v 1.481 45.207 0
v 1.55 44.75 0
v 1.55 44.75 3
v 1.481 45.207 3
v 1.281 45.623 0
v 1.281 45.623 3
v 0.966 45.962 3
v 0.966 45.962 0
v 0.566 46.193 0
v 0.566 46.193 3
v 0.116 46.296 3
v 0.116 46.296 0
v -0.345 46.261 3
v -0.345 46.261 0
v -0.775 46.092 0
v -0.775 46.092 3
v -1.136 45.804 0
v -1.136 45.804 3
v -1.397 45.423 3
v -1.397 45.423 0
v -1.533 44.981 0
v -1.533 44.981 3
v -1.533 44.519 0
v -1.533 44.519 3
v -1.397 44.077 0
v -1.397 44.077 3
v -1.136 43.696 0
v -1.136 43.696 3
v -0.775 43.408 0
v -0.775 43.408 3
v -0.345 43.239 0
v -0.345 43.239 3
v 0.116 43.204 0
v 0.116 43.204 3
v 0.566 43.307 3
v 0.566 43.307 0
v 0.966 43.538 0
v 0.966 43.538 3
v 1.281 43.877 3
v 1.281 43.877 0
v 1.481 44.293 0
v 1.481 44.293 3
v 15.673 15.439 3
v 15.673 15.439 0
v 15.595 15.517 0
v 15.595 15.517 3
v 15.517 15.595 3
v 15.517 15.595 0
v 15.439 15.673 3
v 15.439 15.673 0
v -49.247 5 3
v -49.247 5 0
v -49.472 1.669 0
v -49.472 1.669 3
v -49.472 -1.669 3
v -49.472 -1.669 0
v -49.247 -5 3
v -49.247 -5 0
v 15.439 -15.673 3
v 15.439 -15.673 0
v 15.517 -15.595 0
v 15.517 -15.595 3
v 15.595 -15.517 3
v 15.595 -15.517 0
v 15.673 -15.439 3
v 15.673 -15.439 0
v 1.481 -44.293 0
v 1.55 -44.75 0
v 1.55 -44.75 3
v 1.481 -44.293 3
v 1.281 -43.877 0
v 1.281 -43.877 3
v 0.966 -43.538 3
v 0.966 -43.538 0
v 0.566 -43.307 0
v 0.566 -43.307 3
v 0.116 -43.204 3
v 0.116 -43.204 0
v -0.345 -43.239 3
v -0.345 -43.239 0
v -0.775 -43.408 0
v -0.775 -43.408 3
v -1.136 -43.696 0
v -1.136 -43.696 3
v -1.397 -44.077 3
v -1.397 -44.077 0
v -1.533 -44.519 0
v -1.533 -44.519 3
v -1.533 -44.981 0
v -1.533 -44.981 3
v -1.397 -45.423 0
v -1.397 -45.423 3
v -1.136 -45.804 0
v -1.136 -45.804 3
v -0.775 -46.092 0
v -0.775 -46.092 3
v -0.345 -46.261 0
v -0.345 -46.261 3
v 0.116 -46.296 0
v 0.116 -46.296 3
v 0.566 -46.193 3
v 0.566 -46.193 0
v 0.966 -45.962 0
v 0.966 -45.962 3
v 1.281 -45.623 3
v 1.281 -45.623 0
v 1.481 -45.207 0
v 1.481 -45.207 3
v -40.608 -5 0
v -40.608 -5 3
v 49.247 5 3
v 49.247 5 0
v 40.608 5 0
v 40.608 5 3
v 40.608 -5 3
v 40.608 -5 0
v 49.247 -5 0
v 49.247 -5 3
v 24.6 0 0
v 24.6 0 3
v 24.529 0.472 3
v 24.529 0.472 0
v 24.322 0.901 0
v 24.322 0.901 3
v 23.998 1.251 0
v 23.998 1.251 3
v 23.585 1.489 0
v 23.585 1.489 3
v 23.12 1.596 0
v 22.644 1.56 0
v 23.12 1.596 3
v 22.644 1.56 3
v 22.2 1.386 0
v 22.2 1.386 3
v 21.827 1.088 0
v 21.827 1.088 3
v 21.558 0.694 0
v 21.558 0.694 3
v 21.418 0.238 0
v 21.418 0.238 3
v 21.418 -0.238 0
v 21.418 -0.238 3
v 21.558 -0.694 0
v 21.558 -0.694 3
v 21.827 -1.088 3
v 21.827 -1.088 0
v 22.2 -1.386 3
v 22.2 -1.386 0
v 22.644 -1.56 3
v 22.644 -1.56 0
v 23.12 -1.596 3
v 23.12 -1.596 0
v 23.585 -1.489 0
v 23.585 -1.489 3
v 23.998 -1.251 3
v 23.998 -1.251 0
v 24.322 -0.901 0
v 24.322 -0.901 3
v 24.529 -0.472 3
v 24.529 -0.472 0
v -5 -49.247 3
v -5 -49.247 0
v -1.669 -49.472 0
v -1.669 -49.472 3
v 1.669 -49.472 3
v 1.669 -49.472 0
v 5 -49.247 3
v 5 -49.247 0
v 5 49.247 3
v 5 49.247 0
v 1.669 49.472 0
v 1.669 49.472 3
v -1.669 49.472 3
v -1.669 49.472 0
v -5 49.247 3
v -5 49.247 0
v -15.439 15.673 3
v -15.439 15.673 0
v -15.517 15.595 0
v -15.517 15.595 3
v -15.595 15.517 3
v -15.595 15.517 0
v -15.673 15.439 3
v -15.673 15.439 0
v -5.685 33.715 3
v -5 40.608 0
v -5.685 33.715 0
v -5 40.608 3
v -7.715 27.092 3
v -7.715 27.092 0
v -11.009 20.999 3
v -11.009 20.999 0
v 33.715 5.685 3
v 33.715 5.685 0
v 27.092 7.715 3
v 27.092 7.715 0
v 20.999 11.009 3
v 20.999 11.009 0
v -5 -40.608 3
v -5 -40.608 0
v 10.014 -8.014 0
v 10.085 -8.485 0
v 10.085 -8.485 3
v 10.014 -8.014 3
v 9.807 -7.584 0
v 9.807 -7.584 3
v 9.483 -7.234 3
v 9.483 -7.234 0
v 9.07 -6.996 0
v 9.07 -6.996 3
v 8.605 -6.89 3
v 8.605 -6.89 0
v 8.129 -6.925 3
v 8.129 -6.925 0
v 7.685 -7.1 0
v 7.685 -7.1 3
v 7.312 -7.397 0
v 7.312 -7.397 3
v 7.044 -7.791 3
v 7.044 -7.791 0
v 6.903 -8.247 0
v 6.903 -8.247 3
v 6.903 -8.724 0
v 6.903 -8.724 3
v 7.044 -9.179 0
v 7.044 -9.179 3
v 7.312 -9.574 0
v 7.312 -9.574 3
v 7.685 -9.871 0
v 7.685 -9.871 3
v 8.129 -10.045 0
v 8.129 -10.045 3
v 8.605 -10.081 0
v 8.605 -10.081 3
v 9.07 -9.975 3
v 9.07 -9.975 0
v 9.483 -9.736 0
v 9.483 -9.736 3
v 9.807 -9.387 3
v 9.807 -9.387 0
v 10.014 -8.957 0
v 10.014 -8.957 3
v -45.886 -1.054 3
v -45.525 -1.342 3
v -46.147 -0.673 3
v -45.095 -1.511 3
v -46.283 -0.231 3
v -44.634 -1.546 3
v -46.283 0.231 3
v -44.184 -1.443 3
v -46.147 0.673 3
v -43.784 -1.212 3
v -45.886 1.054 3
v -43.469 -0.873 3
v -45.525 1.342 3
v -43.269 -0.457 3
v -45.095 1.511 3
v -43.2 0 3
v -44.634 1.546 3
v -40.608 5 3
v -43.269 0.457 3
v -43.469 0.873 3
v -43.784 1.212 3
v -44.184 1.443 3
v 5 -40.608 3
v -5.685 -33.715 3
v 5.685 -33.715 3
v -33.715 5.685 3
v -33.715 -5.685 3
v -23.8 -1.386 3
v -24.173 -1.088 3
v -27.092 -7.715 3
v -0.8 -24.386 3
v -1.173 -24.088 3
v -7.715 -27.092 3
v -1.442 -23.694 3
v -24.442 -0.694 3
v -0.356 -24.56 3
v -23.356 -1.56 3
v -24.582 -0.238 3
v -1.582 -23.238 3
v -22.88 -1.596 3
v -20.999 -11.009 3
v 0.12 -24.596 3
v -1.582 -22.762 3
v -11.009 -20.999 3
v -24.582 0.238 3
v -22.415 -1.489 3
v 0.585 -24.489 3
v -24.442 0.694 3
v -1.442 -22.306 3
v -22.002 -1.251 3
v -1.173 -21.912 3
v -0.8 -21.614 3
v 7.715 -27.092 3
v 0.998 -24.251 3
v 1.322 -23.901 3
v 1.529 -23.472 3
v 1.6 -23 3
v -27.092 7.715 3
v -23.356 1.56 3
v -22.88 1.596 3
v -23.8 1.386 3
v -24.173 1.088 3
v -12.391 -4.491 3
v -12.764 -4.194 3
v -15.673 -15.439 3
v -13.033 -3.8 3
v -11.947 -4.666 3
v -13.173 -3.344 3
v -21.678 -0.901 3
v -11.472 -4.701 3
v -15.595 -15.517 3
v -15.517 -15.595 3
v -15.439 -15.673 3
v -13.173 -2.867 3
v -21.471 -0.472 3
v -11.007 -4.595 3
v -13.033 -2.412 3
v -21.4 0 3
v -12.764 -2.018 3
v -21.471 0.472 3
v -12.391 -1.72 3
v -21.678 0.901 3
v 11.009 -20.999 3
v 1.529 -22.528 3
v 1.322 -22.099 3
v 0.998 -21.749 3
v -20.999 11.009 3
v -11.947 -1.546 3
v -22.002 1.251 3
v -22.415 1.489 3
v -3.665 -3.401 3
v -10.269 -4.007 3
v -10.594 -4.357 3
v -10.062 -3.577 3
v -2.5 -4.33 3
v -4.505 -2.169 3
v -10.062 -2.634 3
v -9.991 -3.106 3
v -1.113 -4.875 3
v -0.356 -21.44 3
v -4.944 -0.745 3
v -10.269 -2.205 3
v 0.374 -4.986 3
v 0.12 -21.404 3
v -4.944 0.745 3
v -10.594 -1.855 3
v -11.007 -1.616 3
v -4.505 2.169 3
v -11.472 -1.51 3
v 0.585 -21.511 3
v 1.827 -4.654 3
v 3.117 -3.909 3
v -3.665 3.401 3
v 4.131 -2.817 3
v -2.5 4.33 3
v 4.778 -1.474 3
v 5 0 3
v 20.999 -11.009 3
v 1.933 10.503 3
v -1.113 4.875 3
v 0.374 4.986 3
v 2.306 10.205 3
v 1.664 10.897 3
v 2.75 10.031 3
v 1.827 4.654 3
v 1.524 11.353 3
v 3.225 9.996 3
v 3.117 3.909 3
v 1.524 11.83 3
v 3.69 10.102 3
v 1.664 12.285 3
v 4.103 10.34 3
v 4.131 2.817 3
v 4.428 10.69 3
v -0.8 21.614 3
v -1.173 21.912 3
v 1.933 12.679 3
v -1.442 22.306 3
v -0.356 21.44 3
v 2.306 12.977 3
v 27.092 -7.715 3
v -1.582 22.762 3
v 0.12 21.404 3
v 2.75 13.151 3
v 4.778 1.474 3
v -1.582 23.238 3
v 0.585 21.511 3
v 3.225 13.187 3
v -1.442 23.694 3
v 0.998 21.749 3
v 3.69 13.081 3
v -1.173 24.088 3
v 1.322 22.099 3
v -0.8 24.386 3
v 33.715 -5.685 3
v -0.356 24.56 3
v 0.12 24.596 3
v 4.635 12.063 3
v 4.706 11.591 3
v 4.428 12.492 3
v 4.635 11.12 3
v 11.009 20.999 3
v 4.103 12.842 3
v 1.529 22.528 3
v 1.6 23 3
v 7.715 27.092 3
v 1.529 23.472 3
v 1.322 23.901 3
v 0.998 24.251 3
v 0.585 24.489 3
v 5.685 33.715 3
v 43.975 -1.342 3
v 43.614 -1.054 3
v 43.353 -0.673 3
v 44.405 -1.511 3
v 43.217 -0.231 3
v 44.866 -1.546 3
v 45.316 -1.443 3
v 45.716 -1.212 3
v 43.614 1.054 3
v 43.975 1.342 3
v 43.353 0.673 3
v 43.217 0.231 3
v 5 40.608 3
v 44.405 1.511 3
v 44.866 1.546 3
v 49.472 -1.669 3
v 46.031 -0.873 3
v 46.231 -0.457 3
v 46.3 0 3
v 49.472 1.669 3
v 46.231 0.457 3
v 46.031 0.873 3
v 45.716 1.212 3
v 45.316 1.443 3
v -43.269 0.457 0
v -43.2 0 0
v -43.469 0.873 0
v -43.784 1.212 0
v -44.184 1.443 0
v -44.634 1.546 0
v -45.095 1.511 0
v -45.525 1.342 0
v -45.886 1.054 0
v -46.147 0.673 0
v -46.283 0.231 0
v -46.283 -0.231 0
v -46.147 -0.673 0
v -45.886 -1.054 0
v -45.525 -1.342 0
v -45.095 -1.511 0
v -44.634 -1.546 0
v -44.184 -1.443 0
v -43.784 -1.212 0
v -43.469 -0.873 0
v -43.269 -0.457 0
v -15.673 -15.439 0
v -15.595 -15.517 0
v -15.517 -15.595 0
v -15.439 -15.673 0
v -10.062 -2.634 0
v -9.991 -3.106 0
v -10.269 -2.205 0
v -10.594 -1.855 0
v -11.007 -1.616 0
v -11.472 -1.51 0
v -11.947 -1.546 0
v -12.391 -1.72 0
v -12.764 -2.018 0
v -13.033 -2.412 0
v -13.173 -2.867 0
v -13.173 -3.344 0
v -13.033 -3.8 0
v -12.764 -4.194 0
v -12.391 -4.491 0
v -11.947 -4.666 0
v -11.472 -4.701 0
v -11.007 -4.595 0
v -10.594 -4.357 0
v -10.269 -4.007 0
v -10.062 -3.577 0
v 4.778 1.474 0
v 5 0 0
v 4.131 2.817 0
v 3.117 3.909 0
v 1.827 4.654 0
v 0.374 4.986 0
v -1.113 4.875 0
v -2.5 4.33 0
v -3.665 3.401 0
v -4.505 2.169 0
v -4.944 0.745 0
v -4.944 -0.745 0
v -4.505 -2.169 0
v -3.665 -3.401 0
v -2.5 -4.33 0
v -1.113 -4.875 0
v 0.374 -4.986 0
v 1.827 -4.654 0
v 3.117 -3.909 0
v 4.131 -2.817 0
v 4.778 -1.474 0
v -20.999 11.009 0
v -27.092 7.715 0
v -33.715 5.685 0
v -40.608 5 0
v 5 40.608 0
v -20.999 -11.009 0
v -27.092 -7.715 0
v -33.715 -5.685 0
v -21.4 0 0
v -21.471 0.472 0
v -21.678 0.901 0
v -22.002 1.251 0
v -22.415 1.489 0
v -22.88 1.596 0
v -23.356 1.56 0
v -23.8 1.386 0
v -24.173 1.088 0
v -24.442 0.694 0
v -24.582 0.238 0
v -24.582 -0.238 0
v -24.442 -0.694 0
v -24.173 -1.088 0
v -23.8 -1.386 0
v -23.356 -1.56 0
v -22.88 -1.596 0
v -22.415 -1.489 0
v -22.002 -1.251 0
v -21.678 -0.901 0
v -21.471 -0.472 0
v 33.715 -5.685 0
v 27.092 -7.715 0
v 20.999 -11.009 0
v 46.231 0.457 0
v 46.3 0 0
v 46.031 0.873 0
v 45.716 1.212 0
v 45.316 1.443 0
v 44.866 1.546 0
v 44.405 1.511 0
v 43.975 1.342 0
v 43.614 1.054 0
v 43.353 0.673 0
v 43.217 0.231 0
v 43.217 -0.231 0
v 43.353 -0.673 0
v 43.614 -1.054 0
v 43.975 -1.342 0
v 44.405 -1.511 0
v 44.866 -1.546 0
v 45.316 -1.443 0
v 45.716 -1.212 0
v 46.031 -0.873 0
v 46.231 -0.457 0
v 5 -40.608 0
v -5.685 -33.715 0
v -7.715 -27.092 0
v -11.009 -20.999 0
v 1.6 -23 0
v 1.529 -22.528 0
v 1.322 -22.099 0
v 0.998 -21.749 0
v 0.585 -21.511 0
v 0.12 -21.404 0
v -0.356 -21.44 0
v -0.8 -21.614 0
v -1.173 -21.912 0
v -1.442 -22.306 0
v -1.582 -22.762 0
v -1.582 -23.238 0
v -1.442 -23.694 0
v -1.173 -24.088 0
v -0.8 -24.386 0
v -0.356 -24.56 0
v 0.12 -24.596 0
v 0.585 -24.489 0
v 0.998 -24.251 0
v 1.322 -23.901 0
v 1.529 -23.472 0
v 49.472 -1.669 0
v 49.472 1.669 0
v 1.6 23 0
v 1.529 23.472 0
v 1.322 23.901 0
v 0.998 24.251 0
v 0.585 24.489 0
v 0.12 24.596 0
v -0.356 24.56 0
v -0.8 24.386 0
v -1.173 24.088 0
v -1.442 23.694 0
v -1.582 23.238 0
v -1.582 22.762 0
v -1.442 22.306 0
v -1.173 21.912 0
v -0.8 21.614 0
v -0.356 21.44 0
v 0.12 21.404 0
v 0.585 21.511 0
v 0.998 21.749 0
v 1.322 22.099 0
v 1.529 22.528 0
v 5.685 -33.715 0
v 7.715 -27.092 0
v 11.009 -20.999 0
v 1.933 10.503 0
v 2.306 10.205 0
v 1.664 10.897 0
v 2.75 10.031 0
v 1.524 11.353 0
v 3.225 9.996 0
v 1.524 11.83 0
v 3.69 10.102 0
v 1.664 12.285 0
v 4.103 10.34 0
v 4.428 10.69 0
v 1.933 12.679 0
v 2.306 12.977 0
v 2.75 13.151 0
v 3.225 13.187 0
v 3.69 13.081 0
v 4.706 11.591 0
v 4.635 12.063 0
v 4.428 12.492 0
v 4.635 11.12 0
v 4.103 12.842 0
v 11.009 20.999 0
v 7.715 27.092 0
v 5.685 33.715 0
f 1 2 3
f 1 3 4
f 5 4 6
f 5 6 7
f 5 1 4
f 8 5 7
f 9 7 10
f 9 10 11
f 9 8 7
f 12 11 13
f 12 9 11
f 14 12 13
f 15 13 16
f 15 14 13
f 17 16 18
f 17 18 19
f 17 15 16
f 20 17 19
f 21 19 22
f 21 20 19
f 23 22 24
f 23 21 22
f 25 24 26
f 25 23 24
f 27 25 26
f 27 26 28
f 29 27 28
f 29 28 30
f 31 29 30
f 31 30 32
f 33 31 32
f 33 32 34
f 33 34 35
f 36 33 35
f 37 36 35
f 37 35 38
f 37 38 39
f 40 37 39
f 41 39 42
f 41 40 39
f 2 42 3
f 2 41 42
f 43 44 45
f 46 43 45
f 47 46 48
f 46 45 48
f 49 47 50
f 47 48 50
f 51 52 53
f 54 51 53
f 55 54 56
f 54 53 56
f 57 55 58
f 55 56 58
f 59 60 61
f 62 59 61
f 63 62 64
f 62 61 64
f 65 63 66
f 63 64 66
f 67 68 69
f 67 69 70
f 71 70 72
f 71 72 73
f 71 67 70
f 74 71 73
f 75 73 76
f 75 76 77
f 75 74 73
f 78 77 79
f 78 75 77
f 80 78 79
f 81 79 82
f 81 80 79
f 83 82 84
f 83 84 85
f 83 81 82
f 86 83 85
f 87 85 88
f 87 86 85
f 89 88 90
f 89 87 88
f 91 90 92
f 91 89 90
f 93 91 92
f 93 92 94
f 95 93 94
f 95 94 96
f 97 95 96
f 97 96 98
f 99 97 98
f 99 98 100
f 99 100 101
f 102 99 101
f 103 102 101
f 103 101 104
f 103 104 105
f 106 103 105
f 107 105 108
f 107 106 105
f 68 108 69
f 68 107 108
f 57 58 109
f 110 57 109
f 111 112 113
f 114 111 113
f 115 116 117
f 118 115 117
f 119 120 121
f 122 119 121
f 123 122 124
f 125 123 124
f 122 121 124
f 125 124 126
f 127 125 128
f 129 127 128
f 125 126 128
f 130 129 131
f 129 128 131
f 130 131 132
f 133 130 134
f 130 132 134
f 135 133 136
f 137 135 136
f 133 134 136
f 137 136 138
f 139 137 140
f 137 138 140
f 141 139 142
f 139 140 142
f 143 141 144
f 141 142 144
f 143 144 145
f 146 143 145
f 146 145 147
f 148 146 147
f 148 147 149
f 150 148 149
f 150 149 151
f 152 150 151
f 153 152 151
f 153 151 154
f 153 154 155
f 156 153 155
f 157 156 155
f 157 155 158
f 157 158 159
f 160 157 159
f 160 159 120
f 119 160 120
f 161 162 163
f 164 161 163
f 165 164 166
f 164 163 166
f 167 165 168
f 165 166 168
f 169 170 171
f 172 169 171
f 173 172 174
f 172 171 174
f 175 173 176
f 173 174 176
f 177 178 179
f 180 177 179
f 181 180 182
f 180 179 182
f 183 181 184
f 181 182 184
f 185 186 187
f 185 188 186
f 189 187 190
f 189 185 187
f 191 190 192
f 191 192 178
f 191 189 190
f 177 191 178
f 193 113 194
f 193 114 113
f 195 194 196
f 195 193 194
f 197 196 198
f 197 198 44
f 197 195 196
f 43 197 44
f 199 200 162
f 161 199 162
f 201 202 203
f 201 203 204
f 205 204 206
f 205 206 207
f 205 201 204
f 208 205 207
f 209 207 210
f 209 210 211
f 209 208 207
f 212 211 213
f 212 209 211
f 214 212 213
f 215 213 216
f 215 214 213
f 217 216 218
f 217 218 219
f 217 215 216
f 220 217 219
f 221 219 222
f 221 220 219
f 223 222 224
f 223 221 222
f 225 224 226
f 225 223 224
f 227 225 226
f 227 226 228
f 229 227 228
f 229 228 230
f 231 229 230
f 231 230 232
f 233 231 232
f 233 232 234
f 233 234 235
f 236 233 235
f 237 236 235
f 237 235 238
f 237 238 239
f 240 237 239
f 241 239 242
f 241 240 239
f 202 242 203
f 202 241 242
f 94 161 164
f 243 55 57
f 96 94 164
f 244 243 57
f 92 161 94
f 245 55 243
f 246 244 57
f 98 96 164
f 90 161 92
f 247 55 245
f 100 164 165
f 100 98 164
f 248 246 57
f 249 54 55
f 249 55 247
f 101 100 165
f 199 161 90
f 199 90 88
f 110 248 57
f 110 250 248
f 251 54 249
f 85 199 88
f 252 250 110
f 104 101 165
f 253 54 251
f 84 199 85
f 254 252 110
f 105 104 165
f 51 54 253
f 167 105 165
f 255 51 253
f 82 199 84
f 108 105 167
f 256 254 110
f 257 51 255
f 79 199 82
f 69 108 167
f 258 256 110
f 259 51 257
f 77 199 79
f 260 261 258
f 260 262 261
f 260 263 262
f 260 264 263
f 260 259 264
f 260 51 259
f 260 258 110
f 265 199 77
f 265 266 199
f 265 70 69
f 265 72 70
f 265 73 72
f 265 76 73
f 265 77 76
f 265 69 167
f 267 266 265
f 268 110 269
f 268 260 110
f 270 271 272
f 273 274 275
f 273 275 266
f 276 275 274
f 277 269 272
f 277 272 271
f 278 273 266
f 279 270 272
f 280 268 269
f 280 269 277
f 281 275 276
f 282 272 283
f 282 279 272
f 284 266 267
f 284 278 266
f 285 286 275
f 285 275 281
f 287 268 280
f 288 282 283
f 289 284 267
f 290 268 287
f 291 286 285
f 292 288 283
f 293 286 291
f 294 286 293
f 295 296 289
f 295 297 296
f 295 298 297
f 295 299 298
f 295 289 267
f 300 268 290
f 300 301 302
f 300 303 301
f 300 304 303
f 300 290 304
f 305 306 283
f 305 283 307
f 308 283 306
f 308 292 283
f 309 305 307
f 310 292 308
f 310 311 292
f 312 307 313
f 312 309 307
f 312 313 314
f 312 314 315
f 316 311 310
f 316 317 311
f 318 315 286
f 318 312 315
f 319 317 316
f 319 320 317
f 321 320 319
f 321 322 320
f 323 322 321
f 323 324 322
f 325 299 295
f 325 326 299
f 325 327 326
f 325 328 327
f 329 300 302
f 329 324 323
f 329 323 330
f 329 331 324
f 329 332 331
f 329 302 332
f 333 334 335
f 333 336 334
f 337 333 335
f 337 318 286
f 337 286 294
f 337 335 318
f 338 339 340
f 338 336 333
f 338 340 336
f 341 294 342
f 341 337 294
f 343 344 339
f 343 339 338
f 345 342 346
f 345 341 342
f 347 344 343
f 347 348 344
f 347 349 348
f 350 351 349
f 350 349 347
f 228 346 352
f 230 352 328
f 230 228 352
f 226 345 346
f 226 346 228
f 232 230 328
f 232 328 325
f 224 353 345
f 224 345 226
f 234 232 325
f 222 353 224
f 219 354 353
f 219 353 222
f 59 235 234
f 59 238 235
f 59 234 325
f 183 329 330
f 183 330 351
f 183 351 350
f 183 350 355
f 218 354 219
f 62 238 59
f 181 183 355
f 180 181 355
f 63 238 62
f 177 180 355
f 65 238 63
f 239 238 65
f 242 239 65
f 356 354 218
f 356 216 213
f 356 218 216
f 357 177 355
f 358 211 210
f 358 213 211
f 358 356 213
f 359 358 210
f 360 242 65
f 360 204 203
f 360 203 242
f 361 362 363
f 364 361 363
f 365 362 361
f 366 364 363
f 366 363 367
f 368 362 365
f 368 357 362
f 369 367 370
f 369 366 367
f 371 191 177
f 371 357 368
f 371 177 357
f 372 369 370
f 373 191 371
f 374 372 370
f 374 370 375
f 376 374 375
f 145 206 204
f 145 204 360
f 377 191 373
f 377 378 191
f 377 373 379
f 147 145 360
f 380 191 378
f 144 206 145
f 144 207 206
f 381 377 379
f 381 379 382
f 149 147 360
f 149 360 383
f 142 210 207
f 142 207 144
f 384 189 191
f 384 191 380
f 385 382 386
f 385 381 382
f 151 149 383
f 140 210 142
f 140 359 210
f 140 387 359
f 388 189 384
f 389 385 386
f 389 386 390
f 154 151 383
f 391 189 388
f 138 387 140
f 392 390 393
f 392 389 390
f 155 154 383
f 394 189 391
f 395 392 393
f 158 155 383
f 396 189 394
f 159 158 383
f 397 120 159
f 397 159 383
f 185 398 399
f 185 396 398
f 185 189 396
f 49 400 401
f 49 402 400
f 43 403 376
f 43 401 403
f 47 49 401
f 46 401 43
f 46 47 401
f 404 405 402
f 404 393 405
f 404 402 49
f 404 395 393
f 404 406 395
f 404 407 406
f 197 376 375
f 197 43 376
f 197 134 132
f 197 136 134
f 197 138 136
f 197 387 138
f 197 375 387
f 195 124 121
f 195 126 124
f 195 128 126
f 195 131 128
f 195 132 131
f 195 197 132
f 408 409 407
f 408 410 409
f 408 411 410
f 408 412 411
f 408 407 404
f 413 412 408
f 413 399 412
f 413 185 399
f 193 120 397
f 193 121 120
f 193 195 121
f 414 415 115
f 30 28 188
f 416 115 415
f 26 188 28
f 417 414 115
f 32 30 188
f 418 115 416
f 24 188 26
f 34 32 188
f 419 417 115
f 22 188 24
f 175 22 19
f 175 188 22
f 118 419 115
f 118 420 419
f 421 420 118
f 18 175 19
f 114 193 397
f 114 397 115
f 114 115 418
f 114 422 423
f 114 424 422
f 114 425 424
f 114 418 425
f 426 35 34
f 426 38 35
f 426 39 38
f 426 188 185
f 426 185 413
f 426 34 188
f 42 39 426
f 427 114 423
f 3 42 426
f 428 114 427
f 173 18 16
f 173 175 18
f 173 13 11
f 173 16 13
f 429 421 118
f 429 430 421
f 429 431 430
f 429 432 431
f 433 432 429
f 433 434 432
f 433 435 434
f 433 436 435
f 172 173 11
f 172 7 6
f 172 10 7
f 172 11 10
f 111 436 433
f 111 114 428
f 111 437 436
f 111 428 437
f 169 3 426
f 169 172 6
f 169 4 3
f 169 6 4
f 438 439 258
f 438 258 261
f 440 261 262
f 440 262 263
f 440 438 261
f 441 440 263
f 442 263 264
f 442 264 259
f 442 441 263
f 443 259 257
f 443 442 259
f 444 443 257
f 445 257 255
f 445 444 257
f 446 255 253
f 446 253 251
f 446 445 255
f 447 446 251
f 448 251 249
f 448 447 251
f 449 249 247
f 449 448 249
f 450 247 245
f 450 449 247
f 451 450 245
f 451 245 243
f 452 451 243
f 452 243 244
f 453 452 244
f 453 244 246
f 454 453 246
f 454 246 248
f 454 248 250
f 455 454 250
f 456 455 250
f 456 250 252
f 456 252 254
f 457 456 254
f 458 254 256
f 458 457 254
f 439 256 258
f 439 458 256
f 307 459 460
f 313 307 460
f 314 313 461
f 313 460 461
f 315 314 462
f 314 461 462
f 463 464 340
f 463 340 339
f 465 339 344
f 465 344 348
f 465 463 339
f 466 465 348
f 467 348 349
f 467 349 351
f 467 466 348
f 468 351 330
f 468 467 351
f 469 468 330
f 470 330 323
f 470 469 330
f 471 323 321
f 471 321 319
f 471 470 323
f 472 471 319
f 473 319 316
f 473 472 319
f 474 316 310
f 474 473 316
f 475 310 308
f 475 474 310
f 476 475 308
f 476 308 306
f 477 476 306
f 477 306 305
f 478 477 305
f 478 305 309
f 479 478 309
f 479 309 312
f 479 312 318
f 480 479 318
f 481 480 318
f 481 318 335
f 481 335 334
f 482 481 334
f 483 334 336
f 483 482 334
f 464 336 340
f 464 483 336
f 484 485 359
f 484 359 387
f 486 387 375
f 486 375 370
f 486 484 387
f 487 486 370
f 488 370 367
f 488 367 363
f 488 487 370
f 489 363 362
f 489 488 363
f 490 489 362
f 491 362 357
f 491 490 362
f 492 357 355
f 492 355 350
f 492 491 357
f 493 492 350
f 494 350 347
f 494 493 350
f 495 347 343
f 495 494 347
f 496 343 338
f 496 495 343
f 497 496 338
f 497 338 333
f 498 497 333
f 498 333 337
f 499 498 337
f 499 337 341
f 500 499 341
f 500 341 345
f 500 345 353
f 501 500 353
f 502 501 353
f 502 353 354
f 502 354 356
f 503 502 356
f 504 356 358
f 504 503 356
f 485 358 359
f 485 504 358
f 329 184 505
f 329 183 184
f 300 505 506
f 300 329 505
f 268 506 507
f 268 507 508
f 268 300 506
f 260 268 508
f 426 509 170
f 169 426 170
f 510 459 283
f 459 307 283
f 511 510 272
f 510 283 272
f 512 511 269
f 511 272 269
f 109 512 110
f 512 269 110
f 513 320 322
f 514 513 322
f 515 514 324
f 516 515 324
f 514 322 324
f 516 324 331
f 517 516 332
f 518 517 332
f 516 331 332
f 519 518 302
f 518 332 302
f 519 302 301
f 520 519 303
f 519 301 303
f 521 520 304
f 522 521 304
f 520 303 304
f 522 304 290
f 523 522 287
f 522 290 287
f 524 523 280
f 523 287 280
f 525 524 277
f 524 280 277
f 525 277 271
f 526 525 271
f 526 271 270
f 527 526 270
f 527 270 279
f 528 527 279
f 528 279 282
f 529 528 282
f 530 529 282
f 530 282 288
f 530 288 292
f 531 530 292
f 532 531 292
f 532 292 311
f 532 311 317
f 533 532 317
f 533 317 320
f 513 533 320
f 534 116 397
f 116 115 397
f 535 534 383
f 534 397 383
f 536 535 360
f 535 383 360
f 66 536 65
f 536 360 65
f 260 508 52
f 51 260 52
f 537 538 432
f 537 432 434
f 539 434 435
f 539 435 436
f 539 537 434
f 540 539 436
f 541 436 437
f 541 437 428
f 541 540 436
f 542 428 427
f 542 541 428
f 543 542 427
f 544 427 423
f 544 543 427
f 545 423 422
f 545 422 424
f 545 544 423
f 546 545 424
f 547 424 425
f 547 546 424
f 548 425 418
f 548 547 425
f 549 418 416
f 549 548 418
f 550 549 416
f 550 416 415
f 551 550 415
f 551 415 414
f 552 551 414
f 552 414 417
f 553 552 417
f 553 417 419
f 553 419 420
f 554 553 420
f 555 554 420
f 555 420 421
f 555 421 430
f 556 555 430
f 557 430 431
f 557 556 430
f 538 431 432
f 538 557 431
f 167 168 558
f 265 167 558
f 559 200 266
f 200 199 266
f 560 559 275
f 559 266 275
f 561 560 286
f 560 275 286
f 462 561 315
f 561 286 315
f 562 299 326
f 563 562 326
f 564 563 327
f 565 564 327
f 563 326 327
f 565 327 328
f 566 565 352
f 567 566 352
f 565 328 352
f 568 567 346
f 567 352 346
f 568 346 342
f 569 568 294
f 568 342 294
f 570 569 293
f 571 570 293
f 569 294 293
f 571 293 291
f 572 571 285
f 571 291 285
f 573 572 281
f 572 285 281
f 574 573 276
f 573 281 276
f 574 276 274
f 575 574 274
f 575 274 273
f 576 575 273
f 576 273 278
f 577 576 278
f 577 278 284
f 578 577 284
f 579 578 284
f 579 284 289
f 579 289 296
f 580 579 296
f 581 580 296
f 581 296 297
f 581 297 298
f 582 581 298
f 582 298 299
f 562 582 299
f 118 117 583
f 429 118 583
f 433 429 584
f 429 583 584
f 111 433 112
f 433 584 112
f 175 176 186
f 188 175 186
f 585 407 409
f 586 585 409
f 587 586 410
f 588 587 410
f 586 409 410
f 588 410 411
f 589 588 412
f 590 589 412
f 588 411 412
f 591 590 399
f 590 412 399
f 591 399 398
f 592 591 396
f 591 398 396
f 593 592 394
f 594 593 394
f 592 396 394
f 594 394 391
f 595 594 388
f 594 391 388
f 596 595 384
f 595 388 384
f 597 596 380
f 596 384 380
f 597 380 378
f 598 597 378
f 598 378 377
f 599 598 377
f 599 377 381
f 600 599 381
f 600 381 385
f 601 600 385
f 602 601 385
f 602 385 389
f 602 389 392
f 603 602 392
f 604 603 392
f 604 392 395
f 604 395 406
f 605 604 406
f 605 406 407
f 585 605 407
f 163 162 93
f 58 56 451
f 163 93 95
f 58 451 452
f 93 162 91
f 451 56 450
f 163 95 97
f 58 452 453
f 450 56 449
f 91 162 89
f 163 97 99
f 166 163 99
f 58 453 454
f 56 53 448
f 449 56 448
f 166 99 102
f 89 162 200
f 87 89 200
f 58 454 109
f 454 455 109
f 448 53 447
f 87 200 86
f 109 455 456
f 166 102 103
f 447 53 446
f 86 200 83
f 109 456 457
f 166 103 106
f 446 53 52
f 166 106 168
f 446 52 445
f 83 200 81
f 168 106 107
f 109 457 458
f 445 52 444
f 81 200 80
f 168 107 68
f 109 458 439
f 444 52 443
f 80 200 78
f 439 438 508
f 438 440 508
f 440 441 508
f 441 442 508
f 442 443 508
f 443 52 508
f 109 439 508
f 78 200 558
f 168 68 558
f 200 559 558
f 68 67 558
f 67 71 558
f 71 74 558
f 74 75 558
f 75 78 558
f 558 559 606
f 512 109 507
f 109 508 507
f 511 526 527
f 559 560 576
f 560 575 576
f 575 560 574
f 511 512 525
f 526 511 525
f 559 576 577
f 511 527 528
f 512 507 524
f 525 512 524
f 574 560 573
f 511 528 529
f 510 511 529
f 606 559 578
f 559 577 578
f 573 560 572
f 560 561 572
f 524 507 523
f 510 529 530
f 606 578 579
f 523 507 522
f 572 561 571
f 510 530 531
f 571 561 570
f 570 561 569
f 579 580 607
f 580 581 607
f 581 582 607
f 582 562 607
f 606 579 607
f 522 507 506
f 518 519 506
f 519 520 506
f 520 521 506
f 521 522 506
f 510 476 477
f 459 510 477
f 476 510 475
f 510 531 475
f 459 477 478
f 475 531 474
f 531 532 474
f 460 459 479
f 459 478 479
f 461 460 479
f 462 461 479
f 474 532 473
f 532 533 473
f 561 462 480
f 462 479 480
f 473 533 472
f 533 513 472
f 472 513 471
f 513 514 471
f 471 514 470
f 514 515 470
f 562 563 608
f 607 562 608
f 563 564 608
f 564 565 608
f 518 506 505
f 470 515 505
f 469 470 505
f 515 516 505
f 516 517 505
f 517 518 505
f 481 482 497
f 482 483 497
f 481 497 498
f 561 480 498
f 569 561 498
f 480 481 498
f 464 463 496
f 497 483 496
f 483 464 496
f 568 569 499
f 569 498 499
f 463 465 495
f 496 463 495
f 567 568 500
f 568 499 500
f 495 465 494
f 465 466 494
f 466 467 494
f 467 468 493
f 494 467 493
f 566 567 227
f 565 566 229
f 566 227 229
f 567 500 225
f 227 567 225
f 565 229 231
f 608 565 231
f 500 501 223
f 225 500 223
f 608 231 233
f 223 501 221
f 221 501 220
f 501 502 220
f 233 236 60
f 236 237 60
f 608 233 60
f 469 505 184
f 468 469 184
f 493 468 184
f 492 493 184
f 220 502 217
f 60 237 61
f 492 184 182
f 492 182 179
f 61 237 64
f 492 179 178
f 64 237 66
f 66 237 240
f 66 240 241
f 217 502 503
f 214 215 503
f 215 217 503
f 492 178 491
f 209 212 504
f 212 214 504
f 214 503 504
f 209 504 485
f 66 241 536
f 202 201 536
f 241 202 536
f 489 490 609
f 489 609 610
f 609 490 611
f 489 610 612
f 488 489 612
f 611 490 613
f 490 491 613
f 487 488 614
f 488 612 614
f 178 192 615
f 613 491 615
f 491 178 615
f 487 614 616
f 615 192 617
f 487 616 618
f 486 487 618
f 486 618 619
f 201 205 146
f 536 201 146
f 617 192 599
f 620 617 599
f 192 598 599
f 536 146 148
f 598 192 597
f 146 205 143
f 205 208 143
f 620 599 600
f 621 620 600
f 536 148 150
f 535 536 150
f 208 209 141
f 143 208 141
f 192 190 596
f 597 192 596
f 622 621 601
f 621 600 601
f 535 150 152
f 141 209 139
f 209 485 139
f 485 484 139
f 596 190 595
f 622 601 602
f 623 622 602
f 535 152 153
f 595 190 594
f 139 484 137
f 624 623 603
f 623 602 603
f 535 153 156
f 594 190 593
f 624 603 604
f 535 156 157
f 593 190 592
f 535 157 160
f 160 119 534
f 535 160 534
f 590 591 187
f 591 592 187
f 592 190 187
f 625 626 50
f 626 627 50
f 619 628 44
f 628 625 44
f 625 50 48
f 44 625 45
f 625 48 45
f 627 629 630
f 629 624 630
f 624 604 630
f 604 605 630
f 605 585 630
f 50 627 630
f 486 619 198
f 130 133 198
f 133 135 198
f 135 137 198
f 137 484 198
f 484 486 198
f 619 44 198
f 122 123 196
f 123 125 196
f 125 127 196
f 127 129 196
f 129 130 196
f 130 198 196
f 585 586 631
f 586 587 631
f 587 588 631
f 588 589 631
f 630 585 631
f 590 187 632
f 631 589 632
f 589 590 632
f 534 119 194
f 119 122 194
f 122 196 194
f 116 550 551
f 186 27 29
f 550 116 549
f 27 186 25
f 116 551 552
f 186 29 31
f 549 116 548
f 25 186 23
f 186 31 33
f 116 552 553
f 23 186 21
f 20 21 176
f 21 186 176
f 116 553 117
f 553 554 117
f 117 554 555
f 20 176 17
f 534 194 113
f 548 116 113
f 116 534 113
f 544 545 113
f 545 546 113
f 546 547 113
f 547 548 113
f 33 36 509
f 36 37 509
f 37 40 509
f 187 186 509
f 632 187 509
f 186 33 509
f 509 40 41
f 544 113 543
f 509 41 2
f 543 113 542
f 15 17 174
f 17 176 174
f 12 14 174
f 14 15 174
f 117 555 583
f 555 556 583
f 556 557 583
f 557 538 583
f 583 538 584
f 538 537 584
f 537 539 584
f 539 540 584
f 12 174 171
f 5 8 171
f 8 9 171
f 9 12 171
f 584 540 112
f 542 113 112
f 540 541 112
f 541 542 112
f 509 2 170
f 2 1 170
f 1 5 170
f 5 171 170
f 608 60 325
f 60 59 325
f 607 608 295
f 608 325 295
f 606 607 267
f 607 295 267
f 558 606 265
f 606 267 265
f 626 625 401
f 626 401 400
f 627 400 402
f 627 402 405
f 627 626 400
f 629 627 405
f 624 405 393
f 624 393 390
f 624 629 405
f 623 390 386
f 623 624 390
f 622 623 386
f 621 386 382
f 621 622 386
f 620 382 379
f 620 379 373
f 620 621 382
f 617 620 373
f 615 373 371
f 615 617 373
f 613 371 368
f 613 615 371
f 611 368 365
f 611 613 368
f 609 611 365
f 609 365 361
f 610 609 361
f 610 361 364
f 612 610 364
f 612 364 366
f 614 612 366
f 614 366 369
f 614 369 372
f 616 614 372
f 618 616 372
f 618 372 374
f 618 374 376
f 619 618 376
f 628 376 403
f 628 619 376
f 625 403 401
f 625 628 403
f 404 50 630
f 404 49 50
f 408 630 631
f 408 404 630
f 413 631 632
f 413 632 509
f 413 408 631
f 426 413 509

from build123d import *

# Parameters (mm, degrees)
SKETCH_1_R          = 1.55
SKETCH_1_R_2        = 5
SKETCH_1_R_3        = 1.6
EXTRUDE_1_DEPTH     = 3
FILLET_1_R          = 35
SKETCH_2_R          = 1.6
CUT_EXTRUDE_1_DEPTH = 14


with BuildPart() as part:
    # 草图1 → 凸台-拉伸1 (new body)
    with BuildSketch(Plane.XY):
        with BuildLine():
            Line((49.246827309, 5), (21.424285286, 5))
            ThreePointArc((21.424285286, 5), (15.556349186, 15.556349186), (5, 21.424285286))
            Line((5, 21.424285286), (5, 49.246827309))
            ThreePointArc((5, 49.246827309), (0, 49.5), (-5, 49.246827309))
            Line((-5, 49.246827309), (-5, 21.424285286))
            ThreePointArc((-5, 21.424285286), (-15.556349186, 15.556349186), (-21.424285286, 5))
            Line((-21.424285286, 5), (-49.246827309, 5))
            ThreePointArc((-49.246827309, 5), (-49.5, 0), (-49.246827309, -5))
            Line((-49.246827309, -5), (-21.424285286, -5))
            ThreePointArc((-21.424285286, -5), (-15.556349186, -15.556349186), (-5, -21.424285286))
            Line((-5, -21.424285286), (-5, -49.246827309))
            ThreePointArc((-5, -49.246827309), (0, -49.5), (5, -49.246827309))
            Line((5, -49.246827309), (5, -21.424285286))
            ThreePointArc((5, -21.424285286), (15.556349186, -15.556349186), (21.424285286, -5))
            Line((21.424285286, -5), (49.246827309, -5))
            ThreePointArc((49.246827309, -5), (49.5, 0), (49.246827309, 5))
        make_face()
        with Locations((-44.75, 0)):
            Circle(SKETCH_1_R, mode=Mode.SUBTRACT)
        Circle(SKETCH_1_R_2, mode=Mode.SUBTRACT)
        with Locations((0, 44.75)):
            Circle(SKETCH_1_R, mode=Mode.SUBTRACT)
        with Locations((44.75, 0)):
            Circle(SKETCH_1_R, mode=Mode.SUBTRACT)
        with Locations((0, -44.75)):
            Circle(SKETCH_1_R, mode=Mode.SUBTRACT)
        with Locations((3.105828541, 11.591109915)):
            Circle(SKETCH_1_R_3, mode=Mode.SUBTRACT)
        with Locations((8.485281374, -8.485281374)):
            Circle(SKETCH_1_R_3, mode=Mode.SUBTRACT)
        with Locations((-11.591109915, -3.105828541)):
            Circle(SKETCH_1_R_3, mode=Mode.SUBTRACT)
    extrude(amount=EXTRUDE_1_DEPTH)

    # 圆角1
    fillet_1_edges = [part.edges().sort_by_distance(p)[0] for p in [
        (5, 21.424285286, 1.5),
        (21.424285286, 5, 1.5),
        (21.424285286, -5, 1.5),
        (5, -21.424285286, 1.5),
        (-5, -21.424285286, 1.5),
        (-21.424285286, -5, 1.5),
        (-21.424285286, 5, 1.5),
        (-5, 21.424285286, 1.5),
    ]]
    fillet(fillet_1_edges, radius=FILLET_1_R)

    # 草图2 → 切除-拉伸1 (cut)
    with BuildSketch(Plane.XY.offset(3)):
        with Locations((-23, 0)):
            Circle(SKETCH_2_R)
        with Locations((0, 23)):
            Circle(SKETCH_2_R)
        with Locations((23, 0)):
            Circle(SKETCH_2_R)
        with Locations((0, -23)):
            Circle(SKETCH_2_R)
    extrude(amount=-CUT_EXTRUDE_1_DEPTH, mode=Mode.SUBTRACT)


solid = part.part
